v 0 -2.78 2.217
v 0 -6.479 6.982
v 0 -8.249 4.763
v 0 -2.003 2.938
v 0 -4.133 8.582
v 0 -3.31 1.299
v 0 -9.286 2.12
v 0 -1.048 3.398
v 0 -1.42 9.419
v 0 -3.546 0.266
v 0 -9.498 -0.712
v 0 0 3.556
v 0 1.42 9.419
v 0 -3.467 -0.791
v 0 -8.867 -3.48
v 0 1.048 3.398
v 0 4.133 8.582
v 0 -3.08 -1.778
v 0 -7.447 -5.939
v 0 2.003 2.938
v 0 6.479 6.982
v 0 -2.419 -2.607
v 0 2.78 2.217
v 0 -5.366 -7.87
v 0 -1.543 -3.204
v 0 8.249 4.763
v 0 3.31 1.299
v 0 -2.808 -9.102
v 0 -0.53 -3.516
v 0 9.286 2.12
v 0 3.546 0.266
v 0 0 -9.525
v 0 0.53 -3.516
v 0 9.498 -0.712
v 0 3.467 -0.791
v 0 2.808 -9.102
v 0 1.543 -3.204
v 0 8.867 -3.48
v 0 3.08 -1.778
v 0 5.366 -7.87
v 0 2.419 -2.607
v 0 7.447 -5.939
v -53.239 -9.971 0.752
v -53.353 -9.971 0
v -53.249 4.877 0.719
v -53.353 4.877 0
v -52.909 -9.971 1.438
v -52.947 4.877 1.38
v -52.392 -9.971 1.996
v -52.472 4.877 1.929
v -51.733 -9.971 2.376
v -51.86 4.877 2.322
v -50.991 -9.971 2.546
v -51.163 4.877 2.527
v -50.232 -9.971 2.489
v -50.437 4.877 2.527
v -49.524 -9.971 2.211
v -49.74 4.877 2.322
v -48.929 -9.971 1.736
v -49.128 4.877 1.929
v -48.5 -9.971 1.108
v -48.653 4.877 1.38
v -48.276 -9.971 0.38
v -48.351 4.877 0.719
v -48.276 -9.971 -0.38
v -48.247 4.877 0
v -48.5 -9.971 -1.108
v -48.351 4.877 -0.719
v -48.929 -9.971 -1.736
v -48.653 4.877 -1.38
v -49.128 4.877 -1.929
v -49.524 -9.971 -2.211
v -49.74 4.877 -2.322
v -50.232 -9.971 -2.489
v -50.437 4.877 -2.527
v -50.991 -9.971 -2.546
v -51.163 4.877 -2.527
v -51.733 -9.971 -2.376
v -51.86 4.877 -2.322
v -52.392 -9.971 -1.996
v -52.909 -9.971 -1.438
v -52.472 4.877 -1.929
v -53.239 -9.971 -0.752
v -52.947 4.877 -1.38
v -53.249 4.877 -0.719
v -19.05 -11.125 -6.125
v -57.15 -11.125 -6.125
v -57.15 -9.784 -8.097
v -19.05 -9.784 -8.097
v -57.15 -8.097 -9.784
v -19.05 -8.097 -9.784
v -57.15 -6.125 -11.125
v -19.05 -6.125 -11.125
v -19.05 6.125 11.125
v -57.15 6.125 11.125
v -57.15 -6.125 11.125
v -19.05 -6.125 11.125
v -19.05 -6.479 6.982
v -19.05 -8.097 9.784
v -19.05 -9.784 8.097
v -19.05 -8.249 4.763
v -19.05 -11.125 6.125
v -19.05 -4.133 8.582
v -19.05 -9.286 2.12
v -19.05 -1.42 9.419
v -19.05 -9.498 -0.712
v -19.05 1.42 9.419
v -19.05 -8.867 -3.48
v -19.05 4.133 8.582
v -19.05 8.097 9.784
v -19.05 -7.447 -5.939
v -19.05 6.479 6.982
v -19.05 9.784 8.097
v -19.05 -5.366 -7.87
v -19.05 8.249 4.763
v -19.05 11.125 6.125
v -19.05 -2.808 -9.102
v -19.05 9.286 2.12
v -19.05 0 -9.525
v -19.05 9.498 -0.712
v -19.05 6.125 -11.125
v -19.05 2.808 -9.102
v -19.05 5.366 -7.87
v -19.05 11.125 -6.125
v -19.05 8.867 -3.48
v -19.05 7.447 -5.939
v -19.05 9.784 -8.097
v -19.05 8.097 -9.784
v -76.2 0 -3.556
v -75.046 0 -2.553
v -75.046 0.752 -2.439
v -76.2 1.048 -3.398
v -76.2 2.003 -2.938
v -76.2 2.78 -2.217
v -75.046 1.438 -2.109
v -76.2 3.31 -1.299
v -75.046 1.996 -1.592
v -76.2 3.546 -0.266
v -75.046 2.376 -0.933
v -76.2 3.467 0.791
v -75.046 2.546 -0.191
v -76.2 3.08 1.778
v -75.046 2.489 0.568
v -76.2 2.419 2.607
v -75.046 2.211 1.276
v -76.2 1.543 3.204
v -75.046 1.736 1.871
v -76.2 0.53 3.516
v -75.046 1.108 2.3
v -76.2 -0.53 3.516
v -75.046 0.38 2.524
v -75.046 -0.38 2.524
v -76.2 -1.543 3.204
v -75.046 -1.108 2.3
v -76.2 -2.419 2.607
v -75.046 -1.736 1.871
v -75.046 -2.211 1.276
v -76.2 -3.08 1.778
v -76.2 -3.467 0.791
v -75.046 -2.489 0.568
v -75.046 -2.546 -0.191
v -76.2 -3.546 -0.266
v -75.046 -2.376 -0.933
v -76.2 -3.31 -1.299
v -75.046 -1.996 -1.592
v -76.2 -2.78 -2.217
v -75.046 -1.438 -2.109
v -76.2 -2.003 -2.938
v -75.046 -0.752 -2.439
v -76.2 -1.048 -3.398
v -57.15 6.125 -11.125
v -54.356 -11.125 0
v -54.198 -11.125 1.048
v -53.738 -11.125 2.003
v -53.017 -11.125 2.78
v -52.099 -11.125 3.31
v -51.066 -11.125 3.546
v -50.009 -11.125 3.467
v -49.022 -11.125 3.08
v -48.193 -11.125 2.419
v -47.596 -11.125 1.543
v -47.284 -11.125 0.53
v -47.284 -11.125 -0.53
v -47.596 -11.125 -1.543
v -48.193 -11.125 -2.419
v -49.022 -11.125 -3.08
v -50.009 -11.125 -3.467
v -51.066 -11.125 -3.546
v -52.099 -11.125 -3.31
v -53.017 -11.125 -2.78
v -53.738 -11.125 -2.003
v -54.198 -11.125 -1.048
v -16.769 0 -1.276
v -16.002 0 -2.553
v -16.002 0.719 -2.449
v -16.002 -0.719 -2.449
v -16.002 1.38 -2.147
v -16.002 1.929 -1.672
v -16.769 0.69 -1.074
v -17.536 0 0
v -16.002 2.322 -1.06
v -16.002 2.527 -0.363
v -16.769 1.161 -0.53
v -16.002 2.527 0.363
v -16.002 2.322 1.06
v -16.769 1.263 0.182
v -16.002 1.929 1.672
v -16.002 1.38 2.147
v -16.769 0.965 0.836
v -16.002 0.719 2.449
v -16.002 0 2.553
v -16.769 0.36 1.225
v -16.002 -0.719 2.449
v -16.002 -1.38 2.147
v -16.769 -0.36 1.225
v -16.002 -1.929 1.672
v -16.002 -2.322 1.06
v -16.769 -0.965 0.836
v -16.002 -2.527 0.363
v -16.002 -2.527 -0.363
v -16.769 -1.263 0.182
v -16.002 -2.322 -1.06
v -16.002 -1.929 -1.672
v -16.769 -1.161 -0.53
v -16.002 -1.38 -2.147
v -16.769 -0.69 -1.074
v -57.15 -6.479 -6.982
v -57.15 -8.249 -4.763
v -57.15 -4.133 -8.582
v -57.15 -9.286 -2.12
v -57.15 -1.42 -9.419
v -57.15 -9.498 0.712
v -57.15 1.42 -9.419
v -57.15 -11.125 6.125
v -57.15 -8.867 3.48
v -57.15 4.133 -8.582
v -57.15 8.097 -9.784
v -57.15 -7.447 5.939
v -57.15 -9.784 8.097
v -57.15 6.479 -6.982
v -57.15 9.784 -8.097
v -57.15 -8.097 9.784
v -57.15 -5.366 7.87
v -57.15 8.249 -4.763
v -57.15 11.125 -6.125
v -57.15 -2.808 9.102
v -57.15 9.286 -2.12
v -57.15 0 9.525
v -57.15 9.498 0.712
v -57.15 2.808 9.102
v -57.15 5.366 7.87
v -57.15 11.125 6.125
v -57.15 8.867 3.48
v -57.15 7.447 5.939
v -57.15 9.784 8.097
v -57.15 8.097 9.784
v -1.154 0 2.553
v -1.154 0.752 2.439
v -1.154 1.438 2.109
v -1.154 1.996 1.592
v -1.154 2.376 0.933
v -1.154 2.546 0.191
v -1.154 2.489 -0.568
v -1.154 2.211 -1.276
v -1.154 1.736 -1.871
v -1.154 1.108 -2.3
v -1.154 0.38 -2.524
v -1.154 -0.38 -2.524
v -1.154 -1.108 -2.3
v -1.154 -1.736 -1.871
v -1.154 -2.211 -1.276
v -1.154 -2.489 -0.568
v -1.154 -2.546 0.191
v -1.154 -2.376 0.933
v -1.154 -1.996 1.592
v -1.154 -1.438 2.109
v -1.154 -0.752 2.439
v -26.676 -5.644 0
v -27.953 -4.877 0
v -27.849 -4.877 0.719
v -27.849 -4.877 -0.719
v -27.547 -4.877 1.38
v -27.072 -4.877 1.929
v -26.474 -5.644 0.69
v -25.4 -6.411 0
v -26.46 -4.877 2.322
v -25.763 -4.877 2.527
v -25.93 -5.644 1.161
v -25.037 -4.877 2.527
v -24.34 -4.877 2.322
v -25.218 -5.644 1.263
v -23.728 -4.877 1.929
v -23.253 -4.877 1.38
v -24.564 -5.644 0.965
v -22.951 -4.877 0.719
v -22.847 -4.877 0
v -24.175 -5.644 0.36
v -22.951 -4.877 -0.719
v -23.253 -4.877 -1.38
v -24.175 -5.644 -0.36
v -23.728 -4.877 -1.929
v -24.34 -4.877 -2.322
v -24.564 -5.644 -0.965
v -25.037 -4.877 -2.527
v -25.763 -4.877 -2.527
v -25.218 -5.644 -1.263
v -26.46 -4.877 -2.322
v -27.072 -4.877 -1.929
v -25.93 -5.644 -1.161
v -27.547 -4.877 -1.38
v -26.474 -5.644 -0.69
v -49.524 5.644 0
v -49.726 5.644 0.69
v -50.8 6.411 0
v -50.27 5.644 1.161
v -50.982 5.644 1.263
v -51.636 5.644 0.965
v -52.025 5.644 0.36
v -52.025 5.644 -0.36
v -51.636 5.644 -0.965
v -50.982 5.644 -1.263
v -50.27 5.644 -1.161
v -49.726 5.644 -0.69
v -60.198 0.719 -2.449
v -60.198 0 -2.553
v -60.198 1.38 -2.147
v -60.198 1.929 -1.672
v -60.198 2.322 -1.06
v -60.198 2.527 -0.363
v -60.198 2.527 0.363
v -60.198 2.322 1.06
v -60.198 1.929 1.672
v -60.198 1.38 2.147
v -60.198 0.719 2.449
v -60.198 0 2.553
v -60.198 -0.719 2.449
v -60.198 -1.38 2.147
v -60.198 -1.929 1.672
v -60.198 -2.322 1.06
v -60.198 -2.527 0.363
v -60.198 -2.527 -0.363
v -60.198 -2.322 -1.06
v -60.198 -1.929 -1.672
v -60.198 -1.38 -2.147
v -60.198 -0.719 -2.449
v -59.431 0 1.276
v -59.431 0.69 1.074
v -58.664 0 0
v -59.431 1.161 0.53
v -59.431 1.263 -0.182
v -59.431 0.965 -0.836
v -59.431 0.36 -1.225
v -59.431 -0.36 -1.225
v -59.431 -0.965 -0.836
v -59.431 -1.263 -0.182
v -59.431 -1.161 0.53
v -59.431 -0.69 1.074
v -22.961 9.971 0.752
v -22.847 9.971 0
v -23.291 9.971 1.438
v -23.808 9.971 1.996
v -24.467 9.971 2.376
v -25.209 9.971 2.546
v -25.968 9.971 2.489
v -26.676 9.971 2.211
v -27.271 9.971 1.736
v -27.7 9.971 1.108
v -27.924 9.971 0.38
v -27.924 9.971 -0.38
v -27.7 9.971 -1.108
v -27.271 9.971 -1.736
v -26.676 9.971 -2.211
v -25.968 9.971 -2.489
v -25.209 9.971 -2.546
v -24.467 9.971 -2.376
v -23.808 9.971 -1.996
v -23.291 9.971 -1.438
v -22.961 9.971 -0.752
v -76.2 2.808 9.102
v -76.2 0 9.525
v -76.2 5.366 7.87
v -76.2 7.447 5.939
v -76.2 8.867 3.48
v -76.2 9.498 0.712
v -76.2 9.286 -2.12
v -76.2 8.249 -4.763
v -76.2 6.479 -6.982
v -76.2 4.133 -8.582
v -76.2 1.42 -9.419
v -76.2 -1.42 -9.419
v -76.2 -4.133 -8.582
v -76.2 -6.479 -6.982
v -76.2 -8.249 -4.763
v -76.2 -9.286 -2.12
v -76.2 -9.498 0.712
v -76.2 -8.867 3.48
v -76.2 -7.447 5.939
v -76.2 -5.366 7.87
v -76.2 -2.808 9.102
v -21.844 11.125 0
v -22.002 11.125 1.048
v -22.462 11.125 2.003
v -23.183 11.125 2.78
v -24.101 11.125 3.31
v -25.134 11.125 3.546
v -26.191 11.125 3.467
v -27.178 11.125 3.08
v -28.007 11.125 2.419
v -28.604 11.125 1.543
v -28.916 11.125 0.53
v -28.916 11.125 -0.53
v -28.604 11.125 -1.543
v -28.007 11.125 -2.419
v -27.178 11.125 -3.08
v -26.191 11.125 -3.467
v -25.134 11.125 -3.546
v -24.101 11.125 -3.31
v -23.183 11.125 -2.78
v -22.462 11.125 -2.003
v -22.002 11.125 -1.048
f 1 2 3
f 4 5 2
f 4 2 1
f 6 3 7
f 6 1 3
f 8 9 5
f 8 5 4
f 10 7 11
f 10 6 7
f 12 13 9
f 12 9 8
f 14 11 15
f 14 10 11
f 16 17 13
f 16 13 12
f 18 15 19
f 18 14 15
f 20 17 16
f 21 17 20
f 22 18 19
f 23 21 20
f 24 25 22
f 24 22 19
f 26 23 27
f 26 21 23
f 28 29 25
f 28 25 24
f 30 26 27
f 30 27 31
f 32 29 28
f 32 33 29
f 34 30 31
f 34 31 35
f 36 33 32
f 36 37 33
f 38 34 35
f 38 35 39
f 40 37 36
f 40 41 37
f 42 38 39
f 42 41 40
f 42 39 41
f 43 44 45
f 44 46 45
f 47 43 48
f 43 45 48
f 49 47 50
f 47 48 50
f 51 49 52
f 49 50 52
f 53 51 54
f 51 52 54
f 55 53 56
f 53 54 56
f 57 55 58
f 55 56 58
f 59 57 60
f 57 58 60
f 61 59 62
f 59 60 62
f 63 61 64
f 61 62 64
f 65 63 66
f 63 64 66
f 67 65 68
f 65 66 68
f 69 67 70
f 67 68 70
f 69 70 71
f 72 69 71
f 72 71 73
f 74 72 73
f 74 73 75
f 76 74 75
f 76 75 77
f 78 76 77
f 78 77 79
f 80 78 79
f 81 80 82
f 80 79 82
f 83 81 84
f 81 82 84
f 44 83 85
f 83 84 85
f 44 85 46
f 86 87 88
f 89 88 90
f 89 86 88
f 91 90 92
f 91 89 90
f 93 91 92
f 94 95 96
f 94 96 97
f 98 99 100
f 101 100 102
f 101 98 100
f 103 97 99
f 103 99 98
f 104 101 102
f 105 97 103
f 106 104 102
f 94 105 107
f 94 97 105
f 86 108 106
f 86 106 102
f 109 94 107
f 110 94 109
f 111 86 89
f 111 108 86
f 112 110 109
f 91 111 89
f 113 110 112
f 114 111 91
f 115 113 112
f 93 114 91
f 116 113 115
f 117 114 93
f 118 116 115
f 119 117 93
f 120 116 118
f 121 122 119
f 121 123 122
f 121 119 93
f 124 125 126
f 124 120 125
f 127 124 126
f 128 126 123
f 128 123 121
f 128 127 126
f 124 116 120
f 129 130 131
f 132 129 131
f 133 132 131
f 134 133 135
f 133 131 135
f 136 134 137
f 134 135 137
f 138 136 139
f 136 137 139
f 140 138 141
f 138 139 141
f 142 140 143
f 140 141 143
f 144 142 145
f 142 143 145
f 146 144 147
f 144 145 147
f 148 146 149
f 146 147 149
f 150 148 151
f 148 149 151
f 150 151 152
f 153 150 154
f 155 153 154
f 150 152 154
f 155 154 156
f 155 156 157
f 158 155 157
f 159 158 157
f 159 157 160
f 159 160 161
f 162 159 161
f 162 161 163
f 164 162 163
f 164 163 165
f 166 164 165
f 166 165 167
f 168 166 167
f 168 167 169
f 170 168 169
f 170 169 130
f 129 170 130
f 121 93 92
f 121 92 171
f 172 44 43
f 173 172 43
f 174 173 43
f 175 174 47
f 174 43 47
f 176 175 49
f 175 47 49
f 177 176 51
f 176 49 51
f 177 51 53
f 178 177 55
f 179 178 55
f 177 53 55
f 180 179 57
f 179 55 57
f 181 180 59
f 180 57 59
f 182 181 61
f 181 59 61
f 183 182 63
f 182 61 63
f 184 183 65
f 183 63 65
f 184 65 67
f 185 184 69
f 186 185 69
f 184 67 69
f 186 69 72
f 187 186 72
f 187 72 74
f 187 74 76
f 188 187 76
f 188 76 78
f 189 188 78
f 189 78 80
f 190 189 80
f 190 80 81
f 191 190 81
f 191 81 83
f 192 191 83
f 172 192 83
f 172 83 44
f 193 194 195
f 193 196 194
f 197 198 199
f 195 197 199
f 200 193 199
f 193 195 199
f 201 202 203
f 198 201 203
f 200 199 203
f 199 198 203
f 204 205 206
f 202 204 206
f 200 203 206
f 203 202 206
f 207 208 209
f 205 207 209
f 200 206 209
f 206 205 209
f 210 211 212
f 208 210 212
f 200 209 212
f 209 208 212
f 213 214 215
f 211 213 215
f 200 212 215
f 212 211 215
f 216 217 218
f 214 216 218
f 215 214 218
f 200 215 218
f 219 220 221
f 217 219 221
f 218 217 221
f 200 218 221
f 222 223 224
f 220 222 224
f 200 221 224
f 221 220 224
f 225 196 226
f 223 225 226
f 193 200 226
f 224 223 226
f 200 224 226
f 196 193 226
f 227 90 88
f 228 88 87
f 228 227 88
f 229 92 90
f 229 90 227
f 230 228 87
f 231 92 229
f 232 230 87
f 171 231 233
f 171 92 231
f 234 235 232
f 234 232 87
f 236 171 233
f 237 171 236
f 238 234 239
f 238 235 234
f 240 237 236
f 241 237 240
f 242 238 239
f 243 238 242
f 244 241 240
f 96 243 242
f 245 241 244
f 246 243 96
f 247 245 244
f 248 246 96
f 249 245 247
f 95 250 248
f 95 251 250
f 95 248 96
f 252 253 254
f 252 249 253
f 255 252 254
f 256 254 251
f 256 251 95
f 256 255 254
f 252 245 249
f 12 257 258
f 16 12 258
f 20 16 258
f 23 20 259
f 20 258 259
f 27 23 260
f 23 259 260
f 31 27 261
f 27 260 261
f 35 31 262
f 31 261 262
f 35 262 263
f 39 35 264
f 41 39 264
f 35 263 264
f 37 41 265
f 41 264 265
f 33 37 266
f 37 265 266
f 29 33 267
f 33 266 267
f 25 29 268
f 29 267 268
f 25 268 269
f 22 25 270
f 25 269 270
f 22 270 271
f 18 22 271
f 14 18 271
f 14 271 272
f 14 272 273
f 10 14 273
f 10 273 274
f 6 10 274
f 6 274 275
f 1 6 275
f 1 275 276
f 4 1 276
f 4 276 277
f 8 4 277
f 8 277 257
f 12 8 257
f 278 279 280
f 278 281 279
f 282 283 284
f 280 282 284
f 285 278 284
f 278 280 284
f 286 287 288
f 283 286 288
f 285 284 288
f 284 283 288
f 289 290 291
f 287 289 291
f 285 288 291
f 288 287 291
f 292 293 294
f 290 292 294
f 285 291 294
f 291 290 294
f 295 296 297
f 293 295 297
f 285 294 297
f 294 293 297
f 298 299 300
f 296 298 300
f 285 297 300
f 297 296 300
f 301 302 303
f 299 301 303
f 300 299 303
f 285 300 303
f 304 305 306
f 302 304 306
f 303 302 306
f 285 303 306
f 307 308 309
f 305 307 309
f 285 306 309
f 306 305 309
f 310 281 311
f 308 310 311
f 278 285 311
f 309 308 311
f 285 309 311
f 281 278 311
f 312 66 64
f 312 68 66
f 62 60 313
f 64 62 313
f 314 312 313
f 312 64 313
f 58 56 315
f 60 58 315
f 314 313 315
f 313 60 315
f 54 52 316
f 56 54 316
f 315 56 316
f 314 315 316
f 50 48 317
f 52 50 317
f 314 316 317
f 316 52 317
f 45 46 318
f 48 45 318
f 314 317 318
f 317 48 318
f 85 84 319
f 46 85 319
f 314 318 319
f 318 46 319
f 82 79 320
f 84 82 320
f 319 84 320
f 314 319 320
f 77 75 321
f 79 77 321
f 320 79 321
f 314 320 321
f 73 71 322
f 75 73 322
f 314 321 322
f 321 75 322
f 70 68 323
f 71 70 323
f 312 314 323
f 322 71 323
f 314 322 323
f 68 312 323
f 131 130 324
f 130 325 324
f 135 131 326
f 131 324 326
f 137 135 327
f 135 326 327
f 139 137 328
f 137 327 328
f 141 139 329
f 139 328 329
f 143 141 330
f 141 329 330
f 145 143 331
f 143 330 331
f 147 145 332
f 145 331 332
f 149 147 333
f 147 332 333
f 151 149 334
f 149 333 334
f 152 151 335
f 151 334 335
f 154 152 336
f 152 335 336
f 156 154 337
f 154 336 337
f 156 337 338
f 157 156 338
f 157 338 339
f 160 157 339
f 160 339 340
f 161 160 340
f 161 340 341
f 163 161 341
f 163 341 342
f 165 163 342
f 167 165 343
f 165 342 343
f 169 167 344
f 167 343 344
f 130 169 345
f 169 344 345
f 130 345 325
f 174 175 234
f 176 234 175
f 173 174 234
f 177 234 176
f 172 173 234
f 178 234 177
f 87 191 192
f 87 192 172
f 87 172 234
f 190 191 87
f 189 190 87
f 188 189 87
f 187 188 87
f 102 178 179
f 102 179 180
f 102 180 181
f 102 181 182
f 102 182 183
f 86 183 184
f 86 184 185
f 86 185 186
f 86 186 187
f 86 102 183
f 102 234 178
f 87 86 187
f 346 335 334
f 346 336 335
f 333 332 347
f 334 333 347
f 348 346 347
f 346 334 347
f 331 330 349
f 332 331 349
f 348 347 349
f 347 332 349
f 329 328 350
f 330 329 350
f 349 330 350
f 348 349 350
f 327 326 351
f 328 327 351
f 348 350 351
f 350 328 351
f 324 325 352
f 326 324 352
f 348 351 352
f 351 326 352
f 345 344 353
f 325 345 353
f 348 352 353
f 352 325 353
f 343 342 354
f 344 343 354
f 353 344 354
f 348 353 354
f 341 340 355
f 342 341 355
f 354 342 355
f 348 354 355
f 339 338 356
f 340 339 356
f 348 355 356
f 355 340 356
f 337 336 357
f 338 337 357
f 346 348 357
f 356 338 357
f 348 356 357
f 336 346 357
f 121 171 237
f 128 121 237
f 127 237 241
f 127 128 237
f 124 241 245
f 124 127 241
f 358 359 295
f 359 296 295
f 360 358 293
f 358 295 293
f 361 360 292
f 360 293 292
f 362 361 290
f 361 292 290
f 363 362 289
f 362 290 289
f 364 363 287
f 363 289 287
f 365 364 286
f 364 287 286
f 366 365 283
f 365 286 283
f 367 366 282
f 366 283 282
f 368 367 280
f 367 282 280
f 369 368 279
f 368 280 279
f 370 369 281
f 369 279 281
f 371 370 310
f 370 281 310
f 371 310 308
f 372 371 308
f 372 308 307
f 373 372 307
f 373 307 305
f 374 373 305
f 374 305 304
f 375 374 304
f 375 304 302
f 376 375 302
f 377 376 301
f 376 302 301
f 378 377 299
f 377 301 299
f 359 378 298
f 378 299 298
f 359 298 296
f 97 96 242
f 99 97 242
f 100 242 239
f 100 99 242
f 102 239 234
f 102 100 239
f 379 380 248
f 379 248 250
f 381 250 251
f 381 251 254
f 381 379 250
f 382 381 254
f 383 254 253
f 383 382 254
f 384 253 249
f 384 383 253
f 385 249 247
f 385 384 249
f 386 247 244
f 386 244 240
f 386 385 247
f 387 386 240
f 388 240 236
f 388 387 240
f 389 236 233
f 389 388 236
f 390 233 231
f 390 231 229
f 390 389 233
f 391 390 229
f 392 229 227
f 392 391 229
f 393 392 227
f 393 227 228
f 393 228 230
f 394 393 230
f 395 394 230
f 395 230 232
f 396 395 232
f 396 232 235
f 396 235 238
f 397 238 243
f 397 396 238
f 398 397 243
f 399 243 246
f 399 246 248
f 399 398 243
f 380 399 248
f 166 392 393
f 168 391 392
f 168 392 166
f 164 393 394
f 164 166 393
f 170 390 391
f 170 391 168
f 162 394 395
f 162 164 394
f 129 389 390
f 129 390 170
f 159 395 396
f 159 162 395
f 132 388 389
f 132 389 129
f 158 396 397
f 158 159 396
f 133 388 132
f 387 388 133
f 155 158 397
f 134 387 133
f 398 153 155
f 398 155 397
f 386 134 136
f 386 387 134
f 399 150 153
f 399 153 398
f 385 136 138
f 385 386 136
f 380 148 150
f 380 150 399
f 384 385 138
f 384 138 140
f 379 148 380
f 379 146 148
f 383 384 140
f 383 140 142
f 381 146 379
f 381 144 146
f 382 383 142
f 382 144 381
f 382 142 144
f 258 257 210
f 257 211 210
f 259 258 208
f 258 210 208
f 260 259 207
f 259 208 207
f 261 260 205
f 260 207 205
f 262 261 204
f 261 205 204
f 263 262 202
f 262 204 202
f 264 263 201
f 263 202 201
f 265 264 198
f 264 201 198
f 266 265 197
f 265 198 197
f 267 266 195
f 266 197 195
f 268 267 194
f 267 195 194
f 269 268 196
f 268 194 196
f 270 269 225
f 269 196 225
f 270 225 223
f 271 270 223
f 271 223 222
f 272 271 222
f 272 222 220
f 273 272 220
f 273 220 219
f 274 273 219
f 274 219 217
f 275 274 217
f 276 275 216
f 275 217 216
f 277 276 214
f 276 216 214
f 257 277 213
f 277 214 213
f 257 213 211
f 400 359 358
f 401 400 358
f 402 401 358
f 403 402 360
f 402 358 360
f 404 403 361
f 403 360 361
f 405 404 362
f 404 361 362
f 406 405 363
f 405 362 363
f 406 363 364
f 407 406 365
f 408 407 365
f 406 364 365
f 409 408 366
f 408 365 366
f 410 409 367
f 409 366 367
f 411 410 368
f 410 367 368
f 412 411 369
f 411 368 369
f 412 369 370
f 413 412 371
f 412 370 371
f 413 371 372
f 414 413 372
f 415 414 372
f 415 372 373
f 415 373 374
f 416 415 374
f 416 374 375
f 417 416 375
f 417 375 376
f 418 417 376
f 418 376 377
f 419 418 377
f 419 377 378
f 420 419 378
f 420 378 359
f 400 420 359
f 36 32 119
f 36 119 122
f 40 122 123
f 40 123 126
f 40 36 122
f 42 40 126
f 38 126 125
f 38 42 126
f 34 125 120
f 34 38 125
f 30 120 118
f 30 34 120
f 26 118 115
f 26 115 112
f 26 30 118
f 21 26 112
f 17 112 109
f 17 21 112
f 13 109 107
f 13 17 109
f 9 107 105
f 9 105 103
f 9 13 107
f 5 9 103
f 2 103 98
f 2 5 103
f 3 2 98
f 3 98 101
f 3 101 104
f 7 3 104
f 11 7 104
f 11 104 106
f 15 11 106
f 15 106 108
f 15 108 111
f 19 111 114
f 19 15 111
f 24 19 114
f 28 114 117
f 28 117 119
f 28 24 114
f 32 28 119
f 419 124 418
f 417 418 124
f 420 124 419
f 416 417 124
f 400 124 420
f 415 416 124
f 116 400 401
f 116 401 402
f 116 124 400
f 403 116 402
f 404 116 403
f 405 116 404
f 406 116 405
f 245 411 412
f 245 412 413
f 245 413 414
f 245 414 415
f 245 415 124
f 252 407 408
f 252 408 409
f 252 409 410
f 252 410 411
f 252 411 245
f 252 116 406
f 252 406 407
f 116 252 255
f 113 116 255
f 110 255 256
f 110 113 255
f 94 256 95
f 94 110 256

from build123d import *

# Parameters (mm, degrees)
SKETCH1_R                         = 12.7
BOSS_EXTRUDE1_DEPTH               = 79.375
SKETCH2_R                         = 21.293421543
SKETCH2_R_2                       = 9.525
CUT_EXTRUDE1_DEPTH                = 19.05
SKETCH3_W                         = 88.347660667
SKETCH3_H                         = 62.084650607
CUT_EXTRUDE2_DEPTH                = 7.62
SKETCH7_W                         = 118.824828897
SKETCH7_H                         = 51.847980611
CUT_EXTRUDE5_DEPTH                = 25.4
F_1_4_20_TAPPED_HOLE2_D           = 5.1054
F_1_4_20_TAPPED_HOLE2_DEPTH       = 16.002
F_1_4_20_TAPPED_HOLE2_CSINK_D     = 7.112
F_1_4_20_TAPPED_HOLE2_CSINK_ANGLE = 82
F_1_4_20_TAPPED_HOLE2_TIP         = 1.533816902
F_1_4_20_TAPPED_HOLE3_D           = 5.1054
F_1_4_20_TAPPED_HOLE3_DEPTH       = 16.002
F_1_4_20_TAPPED_HOLE3_CSINK_D     = 7.112
F_1_4_20_TAPPED_HOLE3_CSINK_ANGLE = 82
F_1_4_20_TAPPED_HOLE3_TIP         = 1.533816902
CUT_EXTRUDE10_DEPTH               = 88.9
SKETCH18_R                        = 21.68820387
CUT_EXTRUDE12_DEPTH               = 3.175
SKETCH30_R                        = 17.847306034
SKETCH30_R_2                      = 9.525
CUT_EXTRUDE13_DEPTH               = 19.05
F_1_4_20_TAPPED_HOLE6_D           = 5.1054
F_1_4_20_TAPPED_HOLE6_DEPTH       = 16.002
F_1_4_20_TAPPED_HOLE6_CSINK_D     = 7.112
F_1_4_20_TAPPED_HOLE6_CSINK_ANGLE = 82
F_1_4_20_TAPPED_HOLE6_TIP         = 1.533816902
F_1_4_20_TAPPED_HOLE7_D           = 5.1054
F_1_4_20_TAPPED_HOLE7_DEPTH       = 16.002
F_1_4_20_TAPPED_HOLE7_CSINK_D     = 7.112
F_1_4_20_TAPPED_HOLE7_CSINK_ANGLE = 82
F_1_4_20_TAPPED_HOLE7_TIP         = 1.533816902


with BuildPart() as part:
    # Sketch1 → Boss-Extrude1 (new body)
    with BuildSketch(Plane(origin=(0, 0, 0), x_dir=(0, 0, -1), z_dir=(1, 0, 0))):
        Circle(SKETCH1_R)
    extrude(amount=-BOSS_EXTRUDE1_DEPTH)

    # Sketch2 → Cut-Extrude1 (cut)
    with BuildSketch(Plane(origin=(0, 0, 0), x_dir=(0, 0, -1), z_dir=(1, 0, 0))):
        Circle(SKETCH2_R)
        Circle(SKETCH2_R_2, mode=Mode.SUBTRACT)
    extrude(amount=-CUT_EXTRUDE1_DEPTH, mode=Mode.SUBTRACT)

    # Sketch3 → Cut-Extrude2 (cut)
    with BuildSketch(Plane(origin=(0, 12.401228443, 11.1252), x_dir=(1, 0, 0), z_dir=(0, 0, 1))):
        with Locations((-47.069787049, -6.880973923)):
            Rectangle(SKETCH3_W, SKETCH3_H)
    extrude(amount=CUT_EXTRUDE2_DEPTH, mode=Mode.SUBTRACT)

    # Sketch7 → Cut-Extrude5 (cut)
    with BuildSketch(Plane(origin=(0, 11.1252, 0), x_dir=(-1, 0, 0), z_dir=(0, 1, 0))):
        with Locations((37.000899043, -1.114295637)):
            Rectangle(SKETCH7_W, SKETCH7_H)
    extrude(amount=CUT_EXTRUDE5_DEPTH, mode=Mode.SUBTRACT)

    # 1/4-20 Tapped Hole2
    with Locations(Plane(origin=(0, 11.1252, 0), x_dir=(-1, 0, 0), z_dir=(0, 1, 0))):
        with Locations((25.4, 0)):
            CounterSinkHole(F_1_4_20_TAPPED_HOLE2_D / 2, F_1_4_20_TAPPED_HOLE2_CSINK_D / 2, depth=F_1_4_20_TAPPED_HOLE2_DEPTH, counter_sink_angle=F_1_4_20_TAPPED_HOLE2_CSINK_ANGLE)
            with Locations((0, 0, -(F_1_4_20_TAPPED_HOLE2_DEPTH + F_1_4_20_TAPPED_HOLE2_TIP / 2))):  # 118° drill point
                Cone(0, F_1_4_20_TAPPED_HOLE2_D / 2, F_1_4_20_TAPPED_HOLE2_TIP, mode=Mode.SUBTRACT)

    # 1/4-20 Tapped Hole3
    with Locations(Plane(origin=(0, 0, 0), x_dir=(0, 0, -1), z_dir=(1, 0, 0))):
        with Locations((0, 0)):
            CounterSinkHole(F_1_4_20_TAPPED_HOLE3_D / 2, F_1_4_20_TAPPED_HOLE3_CSINK_D / 2, depth=F_1_4_20_TAPPED_HOLE3_DEPTH, counter_sink_angle=F_1_4_20_TAPPED_HOLE3_CSINK_ANGLE)
            with Locations((0, 0, -(F_1_4_20_TAPPED_HOLE3_DEPTH + F_1_4_20_TAPPED_HOLE3_TIP / 2))):  # 118° drill point
                Cone(0, F_1_4_20_TAPPED_HOLE3_D / 2, F_1_4_20_TAPPED_HOLE3_TIP, mode=Mode.SUBTRACT)

    # Sketch26 → Cut-Extrude10 (cut)
    with BuildSketch(Plane(origin=(0, 0, 0), x_dir=(0, 0, -1), z_dir=(1, 0, 0))):
        Polygon((-14.121239211, -11.1252), (11.1252, -11.1252), (11.1252, 12.077626787), (19.494279453, 12.077626787), (19.494279453, -11.628277338), (15.190001849, -11.628277338), (15.190001849, -15.796314113), (-14.121239211, -15.796314113), align=None)
    extrude(amount=-CUT_EXTRUDE10_DEPTH, mode=Mode.SUBTRACT)

    # Sketch18 → Cut-Extrude12 (cut)
    with BuildSketch(Plane.ZY.offset(79.375)):
        Circle(SKETCH18_R)
    extrude(amount=-CUT_EXTRUDE12_DEPTH, mode=Mode.SUBTRACT)

    # Sketch30 → Cut-Extrude13 (cut)
    with BuildSketch(Plane.ZY.offset(76.2)):
        Circle(SKETCH30_R)
        Circle(SKETCH30_R_2, mode=Mode.SUBTRACT)
    extrude(amount=-CUT_EXTRUDE13_DEPTH, mode=Mode.SUBTRACT)

    # 1/4-20 Tapped Hole6
    with Locations(Plane.ZY.offset(76.2)):
        with Locations((0, 0)):
            CounterSinkHole(F_1_4_20_TAPPED_HOLE6_D / 2, F_1_4_20_TAPPED_HOLE6_CSINK_D / 2, depth=F_1_4_20_TAPPED_HOLE6_DEPTH, counter_sink_angle=F_1_4_20_TAPPED_HOLE6_CSINK_ANGLE)
            with Locations((0, 0, -(F_1_4_20_TAPPED_HOLE6_DEPTH + F_1_4_20_TAPPED_HOLE6_TIP / 2))):  # 118° drill point
                Cone(0, F_1_4_20_TAPPED_HOLE6_D / 2, F_1_4_20_TAPPED_HOLE6_TIP, mode=Mode.SUBTRACT)

    # 1/4-20 Tapped Hole7
    with Locations(Plane.XZ.offset(11.1252)):
        with Locations((-50.8, 0)):
            CounterSinkHole(F_1_4_20_TAPPED_HOLE7_D / 2, F_1_4_20_TAPPED_HOLE7_CSINK_D / 2, depth=F_1_4_20_TAPPED_HOLE7_DEPTH, counter_sink_angle=F_1_4_20_TAPPED_HOLE7_CSINK_ANGLE)
            with Locations((0, 0, -(F_1_4_20_TAPPED_HOLE7_DEPTH + F_1_4_20_TAPPED_HOLE7_TIP / 2))):  # 118° drill point
                Cone(0, F_1_4_20_TAPPED_HOLE7_D / 2, F_1_4_20_TAPPED_HOLE7_TIP, mode=Mode.SUBTRACT)


solid = part.part
